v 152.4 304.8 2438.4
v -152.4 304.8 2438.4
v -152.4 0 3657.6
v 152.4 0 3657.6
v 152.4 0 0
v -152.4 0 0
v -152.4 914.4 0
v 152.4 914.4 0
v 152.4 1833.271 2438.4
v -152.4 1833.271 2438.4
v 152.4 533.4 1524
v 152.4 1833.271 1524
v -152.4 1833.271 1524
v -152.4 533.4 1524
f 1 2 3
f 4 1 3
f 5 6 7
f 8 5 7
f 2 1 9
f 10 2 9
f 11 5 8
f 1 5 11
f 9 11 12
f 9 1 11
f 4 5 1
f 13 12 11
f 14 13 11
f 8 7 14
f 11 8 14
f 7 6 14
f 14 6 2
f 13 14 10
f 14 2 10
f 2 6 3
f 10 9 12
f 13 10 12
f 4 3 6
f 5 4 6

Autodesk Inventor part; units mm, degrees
ref_plane "YZ Plane" through (0, 0, 0) normal (1, 0, 0) x (0, 1, 0)
ref_plane "XZ Plane" through (0, 0, 0) normal (0, 1, 0) x (-1, 0, 0)
ref_plane "XY Plane" through (0, 0, 0) normal (0, 0, 1) x (1, 0, 0)
sketch "Sketch1" plane through (0, 0, 0) normal (1, 0, 0) x (0, 1, 0)
  line L0 (0, 0) -> (914.4, 0)
  line L1 (914.4, 0) -> (0, 3657.6)
  line L2 (0, 3657.6) -> (0, 0)
  dimension "rise" = 914.4
  dimension "run" = 3657.6
  dimension "roofAngle" = 14.036
extrude "Extrusion1" add sketch "Sketch1" along normal mid plane 304.8
sketch "Sketch2" plane through (152.4, 0, 0) normal (1, 0, 0) x (0, 0, -1)
  line L0 (0, 914.4) -> (-3657.6, 0) projected
  line L1 (-2438.4, 304.8) -> (-2438.4, 1833.2707)
  line L2 (-2438.4, 1833.2707) -> (-1524, 1833.2707)
  line L3 (-1524, 1833.2707) -> (-1524, 533.4)
  point P0 (0, 0)
  dimension "d5" = 1219.2
  dimension "d6" = 914.4
extrude "Extrusion2" add sketch "Sketch2" against normal blind 304.8
properties part number "roof"
